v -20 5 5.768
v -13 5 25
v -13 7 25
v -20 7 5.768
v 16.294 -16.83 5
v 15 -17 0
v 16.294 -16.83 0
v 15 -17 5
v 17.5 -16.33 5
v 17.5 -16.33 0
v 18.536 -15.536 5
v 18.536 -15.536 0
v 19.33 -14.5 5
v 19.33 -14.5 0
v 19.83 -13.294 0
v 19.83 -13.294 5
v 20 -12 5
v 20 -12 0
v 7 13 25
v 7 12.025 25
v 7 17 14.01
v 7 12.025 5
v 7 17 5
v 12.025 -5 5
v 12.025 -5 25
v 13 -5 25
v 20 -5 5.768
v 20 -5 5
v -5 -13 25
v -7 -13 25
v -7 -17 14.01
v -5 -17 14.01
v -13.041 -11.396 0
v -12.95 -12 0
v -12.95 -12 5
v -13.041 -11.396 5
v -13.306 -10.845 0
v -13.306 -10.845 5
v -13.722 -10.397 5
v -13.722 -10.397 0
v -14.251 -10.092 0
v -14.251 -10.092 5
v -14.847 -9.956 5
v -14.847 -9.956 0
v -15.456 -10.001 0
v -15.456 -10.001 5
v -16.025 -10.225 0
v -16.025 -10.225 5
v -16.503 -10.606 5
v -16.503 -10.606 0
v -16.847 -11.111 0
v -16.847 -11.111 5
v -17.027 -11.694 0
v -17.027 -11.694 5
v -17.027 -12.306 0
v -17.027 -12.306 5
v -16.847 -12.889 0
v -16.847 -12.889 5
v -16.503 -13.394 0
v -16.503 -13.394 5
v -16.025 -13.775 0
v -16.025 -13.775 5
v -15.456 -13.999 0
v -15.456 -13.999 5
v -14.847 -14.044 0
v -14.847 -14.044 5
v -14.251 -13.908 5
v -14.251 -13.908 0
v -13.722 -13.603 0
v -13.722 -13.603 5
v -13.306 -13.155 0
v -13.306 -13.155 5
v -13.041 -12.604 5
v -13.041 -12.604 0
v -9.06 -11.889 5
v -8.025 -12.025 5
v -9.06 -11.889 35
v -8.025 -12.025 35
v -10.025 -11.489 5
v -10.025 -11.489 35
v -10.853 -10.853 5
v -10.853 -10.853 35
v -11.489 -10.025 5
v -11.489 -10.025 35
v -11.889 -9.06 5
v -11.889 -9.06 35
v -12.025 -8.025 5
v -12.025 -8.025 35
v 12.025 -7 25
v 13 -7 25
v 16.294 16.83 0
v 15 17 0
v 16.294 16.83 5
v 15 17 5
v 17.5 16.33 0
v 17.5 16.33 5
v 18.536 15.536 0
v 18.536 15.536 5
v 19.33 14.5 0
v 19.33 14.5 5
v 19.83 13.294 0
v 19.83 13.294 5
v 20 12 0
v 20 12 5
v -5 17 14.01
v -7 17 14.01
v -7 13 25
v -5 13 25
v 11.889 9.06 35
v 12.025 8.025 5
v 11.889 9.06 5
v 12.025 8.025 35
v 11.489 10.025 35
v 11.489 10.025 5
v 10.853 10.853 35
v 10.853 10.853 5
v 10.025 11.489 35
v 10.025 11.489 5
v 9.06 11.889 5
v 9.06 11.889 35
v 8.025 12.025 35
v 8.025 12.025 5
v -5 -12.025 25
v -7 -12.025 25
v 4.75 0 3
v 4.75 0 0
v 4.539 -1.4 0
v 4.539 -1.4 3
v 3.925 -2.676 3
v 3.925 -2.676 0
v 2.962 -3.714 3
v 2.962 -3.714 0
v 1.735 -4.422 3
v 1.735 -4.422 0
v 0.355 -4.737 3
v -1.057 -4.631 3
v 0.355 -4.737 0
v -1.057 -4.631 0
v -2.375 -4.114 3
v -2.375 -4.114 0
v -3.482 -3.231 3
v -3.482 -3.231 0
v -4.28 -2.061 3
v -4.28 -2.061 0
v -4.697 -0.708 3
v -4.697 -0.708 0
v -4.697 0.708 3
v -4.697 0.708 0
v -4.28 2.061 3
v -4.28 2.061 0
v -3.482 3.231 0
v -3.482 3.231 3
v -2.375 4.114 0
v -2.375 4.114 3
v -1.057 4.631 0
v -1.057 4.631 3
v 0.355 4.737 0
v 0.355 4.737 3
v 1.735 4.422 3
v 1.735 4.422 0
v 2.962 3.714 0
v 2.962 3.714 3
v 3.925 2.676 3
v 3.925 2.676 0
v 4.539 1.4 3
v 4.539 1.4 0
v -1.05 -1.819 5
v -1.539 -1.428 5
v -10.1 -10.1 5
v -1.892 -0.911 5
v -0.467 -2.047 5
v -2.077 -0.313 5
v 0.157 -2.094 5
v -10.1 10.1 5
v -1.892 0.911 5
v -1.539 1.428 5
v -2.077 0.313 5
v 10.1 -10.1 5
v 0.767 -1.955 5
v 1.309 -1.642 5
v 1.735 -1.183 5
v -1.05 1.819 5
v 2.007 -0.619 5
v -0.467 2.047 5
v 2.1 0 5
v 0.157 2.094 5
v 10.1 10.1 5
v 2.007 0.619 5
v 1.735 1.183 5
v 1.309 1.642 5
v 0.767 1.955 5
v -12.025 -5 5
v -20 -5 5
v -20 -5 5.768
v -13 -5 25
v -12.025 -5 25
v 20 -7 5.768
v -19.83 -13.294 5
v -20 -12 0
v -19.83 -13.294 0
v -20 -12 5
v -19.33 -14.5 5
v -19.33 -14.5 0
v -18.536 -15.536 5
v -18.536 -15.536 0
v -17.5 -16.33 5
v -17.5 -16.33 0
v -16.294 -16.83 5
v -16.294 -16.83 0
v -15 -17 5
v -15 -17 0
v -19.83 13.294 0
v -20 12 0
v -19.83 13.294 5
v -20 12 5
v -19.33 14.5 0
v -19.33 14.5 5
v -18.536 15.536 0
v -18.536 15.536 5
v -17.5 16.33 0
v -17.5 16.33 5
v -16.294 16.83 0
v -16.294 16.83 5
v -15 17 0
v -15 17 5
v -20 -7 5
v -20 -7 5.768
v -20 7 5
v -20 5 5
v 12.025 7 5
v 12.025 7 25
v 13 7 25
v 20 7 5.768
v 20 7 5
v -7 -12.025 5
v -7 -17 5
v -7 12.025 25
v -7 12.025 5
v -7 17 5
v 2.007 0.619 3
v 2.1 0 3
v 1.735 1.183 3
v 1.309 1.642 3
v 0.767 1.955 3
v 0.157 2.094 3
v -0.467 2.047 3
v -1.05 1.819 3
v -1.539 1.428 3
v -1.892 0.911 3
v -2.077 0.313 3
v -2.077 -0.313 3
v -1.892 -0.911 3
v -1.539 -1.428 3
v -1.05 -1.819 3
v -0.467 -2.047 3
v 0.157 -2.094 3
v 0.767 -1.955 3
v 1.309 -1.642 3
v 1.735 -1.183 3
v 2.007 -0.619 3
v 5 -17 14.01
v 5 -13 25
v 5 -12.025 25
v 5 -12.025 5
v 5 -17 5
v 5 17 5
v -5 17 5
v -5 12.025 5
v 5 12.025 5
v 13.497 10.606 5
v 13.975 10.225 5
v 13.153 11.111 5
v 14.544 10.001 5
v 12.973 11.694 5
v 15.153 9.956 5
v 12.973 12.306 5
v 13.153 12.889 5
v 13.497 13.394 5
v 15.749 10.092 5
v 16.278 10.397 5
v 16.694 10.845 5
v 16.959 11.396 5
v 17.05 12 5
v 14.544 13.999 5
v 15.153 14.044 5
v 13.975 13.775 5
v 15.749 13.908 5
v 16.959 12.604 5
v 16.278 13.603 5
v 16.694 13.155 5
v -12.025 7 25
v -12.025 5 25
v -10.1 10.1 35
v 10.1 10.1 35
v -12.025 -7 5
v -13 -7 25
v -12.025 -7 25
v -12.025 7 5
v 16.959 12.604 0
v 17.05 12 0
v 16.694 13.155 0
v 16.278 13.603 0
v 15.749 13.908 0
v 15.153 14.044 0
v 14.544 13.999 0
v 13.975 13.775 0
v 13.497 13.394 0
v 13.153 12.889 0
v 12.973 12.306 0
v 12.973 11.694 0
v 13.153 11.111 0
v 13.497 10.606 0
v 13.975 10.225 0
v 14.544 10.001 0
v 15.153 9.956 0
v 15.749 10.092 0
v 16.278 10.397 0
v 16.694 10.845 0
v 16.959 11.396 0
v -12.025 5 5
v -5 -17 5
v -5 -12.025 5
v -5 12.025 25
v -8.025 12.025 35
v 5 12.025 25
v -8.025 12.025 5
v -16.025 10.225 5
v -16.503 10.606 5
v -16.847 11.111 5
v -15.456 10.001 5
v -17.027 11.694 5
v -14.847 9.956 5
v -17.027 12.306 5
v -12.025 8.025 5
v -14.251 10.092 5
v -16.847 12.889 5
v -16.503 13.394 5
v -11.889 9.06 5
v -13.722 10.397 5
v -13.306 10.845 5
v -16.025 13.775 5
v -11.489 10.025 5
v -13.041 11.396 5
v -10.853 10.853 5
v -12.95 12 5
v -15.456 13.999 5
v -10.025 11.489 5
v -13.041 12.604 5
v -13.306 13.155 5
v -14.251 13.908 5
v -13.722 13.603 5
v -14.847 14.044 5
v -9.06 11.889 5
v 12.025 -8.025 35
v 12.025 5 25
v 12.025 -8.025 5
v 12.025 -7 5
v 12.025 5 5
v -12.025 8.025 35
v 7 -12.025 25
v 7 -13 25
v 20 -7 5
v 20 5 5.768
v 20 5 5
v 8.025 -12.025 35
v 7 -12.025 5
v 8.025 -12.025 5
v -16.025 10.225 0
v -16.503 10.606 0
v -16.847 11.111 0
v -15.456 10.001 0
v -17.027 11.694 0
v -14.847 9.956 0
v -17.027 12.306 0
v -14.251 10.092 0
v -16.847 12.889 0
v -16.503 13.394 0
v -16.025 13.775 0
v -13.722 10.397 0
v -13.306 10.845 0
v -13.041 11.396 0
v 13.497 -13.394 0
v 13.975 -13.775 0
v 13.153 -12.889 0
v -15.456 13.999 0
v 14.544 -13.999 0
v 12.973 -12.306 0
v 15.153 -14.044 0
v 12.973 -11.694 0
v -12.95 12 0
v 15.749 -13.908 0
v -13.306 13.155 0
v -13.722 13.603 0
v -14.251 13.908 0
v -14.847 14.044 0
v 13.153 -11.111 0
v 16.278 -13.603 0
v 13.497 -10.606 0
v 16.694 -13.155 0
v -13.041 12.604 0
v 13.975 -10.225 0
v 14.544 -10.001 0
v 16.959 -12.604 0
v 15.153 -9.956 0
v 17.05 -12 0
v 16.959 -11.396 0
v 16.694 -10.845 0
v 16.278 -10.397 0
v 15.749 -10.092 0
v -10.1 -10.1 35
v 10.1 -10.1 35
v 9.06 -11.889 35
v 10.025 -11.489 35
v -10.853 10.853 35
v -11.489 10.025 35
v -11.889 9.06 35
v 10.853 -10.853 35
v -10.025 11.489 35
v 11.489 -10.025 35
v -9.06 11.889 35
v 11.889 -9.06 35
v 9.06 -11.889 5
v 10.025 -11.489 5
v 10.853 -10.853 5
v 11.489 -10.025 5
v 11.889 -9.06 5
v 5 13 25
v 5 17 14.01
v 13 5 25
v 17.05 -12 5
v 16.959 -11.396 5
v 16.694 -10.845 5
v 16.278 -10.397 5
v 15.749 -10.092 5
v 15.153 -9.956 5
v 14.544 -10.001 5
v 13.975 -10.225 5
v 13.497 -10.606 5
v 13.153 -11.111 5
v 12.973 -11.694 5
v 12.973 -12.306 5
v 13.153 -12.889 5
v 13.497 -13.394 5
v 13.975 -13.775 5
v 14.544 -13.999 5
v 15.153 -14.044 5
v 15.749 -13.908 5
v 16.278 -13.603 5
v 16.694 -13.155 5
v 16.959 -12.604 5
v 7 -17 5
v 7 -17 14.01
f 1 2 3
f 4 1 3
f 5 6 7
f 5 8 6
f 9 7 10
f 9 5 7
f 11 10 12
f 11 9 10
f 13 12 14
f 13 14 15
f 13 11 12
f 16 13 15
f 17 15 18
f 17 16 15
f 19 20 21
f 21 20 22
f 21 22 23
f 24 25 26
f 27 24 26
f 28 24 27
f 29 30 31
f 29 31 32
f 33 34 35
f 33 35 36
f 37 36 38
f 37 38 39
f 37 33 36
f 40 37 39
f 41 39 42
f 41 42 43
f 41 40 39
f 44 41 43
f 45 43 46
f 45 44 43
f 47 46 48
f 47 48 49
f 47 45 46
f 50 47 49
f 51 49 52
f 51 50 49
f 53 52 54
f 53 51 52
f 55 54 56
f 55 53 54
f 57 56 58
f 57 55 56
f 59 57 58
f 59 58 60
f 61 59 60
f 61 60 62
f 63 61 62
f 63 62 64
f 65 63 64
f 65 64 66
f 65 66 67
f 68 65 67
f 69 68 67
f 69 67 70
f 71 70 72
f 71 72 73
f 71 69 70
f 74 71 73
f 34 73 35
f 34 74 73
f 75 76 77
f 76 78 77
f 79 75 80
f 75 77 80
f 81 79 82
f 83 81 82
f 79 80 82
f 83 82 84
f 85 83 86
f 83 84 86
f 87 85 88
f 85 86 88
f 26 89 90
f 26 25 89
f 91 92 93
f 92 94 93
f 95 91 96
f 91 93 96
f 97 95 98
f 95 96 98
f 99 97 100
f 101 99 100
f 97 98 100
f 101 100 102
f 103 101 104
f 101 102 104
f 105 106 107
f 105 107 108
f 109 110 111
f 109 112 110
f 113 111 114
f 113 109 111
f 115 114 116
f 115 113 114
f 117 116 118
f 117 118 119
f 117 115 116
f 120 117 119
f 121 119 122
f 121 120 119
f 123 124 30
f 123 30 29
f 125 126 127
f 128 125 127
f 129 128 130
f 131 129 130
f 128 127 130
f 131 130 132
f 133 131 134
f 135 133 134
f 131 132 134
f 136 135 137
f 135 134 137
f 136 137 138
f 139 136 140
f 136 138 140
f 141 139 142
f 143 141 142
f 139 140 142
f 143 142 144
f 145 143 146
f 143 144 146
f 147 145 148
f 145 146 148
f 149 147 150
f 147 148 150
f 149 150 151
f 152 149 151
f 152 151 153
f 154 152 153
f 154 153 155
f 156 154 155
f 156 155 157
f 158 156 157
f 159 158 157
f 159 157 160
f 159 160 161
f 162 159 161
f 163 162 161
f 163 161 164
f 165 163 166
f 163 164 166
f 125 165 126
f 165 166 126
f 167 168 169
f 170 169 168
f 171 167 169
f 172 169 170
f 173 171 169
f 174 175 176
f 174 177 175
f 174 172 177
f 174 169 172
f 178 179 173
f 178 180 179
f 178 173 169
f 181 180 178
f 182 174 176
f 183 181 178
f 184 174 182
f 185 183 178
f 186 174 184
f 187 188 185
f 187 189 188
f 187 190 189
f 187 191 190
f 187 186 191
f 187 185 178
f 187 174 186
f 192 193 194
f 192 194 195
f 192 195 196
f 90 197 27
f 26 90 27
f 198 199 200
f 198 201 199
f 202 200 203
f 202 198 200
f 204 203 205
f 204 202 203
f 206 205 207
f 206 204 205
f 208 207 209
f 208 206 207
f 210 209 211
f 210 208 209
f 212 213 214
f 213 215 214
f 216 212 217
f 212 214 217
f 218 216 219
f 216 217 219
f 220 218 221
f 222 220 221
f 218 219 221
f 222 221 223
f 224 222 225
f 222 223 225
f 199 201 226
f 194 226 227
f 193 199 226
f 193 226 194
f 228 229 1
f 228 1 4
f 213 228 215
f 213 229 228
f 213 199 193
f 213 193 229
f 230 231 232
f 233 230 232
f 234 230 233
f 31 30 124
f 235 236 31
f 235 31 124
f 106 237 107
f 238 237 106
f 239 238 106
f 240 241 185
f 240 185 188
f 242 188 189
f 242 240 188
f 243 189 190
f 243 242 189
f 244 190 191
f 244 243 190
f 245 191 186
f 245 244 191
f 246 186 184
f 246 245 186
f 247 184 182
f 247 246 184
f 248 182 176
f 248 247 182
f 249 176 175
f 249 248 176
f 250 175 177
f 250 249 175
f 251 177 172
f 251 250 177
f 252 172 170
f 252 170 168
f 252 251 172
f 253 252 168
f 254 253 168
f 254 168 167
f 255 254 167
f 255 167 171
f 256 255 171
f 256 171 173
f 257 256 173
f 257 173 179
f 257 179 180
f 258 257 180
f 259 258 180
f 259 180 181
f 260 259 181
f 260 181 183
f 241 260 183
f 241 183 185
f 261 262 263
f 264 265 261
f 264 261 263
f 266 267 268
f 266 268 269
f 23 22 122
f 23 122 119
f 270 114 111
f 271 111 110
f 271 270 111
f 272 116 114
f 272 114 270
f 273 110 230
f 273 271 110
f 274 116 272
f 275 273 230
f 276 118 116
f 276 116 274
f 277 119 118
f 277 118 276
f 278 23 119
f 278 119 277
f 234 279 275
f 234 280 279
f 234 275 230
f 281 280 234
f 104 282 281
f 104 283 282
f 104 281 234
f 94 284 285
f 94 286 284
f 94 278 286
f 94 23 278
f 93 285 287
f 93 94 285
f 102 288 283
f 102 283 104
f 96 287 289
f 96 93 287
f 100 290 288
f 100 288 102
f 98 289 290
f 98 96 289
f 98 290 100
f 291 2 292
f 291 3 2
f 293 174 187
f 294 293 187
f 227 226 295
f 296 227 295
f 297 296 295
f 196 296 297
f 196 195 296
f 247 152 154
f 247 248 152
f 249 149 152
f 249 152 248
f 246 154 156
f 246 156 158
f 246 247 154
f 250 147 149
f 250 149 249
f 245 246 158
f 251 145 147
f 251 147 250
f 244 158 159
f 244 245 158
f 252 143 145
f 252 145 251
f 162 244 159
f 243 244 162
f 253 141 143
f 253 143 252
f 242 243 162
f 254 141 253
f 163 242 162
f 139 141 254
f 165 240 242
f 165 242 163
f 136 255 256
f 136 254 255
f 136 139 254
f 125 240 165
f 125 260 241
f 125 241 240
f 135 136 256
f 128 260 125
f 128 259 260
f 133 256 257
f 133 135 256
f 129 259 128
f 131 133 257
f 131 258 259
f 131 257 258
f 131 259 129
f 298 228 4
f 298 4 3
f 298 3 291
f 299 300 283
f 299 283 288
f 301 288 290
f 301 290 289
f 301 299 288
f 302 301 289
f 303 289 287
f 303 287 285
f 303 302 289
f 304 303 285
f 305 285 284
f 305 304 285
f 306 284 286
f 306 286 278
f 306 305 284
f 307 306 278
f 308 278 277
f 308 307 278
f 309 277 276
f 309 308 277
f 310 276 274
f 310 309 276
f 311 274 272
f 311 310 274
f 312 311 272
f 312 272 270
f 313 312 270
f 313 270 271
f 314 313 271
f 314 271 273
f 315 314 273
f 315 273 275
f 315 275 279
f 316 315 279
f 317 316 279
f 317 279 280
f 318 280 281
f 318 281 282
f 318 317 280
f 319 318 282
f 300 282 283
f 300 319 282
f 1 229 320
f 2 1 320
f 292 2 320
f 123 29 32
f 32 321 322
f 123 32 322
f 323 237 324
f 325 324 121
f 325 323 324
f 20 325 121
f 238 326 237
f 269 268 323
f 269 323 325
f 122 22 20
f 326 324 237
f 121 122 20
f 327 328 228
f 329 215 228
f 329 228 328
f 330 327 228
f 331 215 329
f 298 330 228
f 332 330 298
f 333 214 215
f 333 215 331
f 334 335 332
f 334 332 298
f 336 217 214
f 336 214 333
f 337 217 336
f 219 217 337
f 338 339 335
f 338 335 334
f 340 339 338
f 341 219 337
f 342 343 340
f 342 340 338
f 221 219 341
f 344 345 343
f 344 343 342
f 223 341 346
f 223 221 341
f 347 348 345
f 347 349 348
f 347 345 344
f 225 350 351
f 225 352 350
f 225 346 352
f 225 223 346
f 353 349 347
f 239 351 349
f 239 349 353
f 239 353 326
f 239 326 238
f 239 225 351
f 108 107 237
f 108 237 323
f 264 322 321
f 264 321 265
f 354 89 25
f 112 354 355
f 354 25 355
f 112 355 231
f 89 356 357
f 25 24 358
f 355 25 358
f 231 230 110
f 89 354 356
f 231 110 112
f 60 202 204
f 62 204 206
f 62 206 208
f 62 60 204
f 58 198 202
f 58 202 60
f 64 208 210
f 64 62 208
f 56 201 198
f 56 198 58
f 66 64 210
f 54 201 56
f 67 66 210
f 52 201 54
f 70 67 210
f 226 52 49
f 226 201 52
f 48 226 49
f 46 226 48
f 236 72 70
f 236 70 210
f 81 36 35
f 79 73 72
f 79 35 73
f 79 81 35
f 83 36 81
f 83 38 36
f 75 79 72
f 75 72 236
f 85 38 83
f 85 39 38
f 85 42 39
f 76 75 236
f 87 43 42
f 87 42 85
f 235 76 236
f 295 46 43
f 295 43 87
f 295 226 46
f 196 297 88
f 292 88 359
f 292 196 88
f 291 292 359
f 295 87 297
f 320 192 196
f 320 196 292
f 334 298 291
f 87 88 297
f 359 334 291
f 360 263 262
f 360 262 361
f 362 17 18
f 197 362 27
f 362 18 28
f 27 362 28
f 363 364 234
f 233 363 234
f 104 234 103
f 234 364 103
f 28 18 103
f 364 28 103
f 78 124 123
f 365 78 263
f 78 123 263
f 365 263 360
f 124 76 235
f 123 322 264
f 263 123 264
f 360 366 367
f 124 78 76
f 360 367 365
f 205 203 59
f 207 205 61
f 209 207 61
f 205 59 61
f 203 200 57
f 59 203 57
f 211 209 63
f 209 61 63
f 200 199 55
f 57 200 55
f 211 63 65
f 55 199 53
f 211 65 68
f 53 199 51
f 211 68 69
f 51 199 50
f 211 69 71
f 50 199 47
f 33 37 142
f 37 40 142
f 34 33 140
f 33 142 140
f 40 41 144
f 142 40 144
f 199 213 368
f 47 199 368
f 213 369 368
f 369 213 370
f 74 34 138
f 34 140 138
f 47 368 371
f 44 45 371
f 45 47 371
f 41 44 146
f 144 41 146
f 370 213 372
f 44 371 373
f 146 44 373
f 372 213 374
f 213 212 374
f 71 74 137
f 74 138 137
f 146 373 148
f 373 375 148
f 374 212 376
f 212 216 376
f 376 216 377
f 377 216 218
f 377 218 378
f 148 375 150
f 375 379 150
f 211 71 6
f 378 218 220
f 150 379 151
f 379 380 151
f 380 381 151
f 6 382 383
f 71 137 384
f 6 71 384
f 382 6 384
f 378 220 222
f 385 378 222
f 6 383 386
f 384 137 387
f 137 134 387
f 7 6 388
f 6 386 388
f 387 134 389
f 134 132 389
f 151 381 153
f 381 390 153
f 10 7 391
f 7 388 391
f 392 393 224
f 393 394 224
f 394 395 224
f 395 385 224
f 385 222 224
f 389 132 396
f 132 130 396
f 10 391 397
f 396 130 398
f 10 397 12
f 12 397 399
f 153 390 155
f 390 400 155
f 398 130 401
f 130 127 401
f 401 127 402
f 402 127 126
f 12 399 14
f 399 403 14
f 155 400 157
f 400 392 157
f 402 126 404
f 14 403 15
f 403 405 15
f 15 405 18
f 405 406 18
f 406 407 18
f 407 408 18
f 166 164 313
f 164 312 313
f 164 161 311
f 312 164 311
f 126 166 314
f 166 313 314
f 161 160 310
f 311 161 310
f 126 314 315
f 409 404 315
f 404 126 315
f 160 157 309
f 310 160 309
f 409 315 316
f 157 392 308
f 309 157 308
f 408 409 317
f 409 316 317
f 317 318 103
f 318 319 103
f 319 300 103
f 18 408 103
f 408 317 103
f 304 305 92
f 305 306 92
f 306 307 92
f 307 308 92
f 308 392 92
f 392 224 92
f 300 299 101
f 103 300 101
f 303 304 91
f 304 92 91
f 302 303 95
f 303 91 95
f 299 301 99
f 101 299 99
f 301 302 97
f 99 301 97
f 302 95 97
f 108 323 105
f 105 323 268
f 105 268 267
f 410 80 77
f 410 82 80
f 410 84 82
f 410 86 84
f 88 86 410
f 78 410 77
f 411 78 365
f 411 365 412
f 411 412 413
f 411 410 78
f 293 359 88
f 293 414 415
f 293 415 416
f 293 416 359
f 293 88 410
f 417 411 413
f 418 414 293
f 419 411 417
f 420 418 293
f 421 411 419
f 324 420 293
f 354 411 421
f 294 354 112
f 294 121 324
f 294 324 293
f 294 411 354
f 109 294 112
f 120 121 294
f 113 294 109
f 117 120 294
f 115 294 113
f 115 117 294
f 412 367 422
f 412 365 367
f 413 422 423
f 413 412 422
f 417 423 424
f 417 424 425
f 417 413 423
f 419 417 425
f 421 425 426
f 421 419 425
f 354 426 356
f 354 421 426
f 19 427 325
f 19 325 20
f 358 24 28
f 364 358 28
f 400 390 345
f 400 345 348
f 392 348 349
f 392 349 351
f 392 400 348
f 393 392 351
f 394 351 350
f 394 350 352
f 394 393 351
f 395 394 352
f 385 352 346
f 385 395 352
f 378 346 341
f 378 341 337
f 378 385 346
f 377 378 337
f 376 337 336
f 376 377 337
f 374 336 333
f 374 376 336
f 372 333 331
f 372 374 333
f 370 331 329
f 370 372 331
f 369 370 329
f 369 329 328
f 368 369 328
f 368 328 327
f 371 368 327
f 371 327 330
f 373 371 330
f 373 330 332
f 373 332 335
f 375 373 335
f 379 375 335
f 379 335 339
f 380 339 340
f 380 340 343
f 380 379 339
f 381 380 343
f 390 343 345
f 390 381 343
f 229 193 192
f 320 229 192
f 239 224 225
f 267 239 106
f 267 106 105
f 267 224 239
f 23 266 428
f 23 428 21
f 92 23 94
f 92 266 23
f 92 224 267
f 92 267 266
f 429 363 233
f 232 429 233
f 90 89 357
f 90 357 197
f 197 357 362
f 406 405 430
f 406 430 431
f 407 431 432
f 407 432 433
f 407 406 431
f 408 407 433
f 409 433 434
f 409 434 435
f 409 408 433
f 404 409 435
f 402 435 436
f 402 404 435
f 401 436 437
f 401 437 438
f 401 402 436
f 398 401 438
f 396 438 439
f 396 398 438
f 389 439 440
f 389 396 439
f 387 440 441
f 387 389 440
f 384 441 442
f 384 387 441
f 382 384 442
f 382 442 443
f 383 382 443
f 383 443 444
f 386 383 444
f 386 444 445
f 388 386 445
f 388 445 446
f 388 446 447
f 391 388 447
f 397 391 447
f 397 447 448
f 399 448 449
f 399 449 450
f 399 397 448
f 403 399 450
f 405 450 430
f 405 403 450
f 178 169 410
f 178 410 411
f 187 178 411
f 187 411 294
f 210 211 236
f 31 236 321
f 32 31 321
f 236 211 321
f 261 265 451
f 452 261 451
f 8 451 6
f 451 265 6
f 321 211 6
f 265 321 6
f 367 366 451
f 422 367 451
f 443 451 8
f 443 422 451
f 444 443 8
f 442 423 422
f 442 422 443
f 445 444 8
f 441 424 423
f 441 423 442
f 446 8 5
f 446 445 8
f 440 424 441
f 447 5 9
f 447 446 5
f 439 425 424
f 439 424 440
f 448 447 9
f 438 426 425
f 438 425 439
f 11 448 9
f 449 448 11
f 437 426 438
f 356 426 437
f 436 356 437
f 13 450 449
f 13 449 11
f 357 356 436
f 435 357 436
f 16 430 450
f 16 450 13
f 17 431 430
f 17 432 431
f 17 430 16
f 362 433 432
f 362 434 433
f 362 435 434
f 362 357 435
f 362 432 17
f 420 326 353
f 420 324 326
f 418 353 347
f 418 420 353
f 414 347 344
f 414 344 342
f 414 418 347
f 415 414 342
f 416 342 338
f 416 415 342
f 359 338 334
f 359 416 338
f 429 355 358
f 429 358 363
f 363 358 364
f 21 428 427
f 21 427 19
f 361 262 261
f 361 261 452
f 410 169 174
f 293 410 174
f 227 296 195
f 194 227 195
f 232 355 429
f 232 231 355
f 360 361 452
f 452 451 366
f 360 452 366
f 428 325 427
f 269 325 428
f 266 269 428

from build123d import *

# Parameters (mm, degrees)
F0_W        = 40
F0_H        = 34
F0_R        = 2.05
F0_R_2      = 2.1
F1_DEPTH    = 5
F2_R        = 4.75
F2_R_2      = 2.1
F3_DEPTH    = 3
F4_W        = 24.05
F4_H        = 24.05
F4_W_2      = 20.2
F4_H_2      = 20.2
F5_DEPTH    = 30
F6_R        = 5
F7_R        = 4
F8_W        = 2
F8_H        = 4.975
F8_W_2      = 7.975
F8_H_2      = 2
F9_DEPTH    = 20
F10_SIZE2   = 19.2323419362
F10_SIZE    = 7
F10_2_SIZE2 = 19.2323419362
F10_2_SIZE  = 7
F11_SIZE2   = 7
F11_SIZE    = 19.2323419362
F12_SIZE2   = 4
F12_SIZE    = 10.9899096778
F13_SIZE2   = 10.9899096778
F13_SIZE    = 4
F13_2_SIZE2 = 10.9899096778
F13_2_SIZE  = 4


with BuildPart() as f1:
    # F0 (on Top) → F1 (new body)
    with BuildSketch(Plane.XY):
        Rectangle(F0_W, F0_H)
        with Locations((-15, -12)):
            Circle(F0_R, mode=Mode.SUBTRACT)
        with Locations((15, -12)):
            Circle(F0_R, mode=Mode.SUBTRACT)
        with Locations((-15, 12)):
            Circle(F0_R, mode=Mode.SUBTRACT)
        Circle(F0_R_2, mode=Mode.SUBTRACT)
        with Locations((15, 12)):
            Circle(F0_R, mode=Mode.SUBTRACT)
    extrude(amount=F1_DEPTH)

    # F2 (on face) → F3 (cut)
    with BuildSketch(Plane(origin=(0, 0, 0), x_dir=(1, 0, 0), z_dir=(0, 0, -1))):
        Circle(F2_R)
        Circle(F2_R_2, mode=Mode.SUBTRACT)
    extrude(amount=-F3_DEPTH, mode=Mode.SUBTRACT)

    # F4 (on face) → F5 (join)
    with BuildSketch(Plane.XY.offset(5)):
        Rectangle(F4_W, F4_H)
        Rectangle(F4_W_2, F4_H_2, mode=Mode.SUBTRACT)
    extrude(amount=F5_DEPTH)

    # F6
    f6_edges = [f1.edges().sort_by_distance(p)[0] for p in [
        (20, 17, 2.5),
        (20, -17, 2.5),
        (-20, -17, 2.5),
        (-20, 17, 2.5),
    ]]
    fillet(f6_edges, radius=F6_R)

    # F7
    f7_edges = [f1.edges().sort_by_distance(p)[0] for p in [
        (12.025, -12.025, 20),
        (12.025, 12.025, 20),
        (-12.025, -12.025, 20),
        (-12.025, 12.025, 20),
    ]]
    fillet(f7_edges, radius=F7_R)

    # F8 (on face) → F9 (join)
    with BuildSketch(Plane.XY.offset(5)):
        with Locations((-6, 14.5125)):
            Rectangle(F8_W, F8_H)
        with Locations((6, 14.5125)):
            Rectangle(F8_W, F8_H)
        with Locations((16.0125, 6)):
            Rectangle(F8_W_2, F8_H_2)
        with Locations((16.0125, -6)):
            Rectangle(F8_W_2, F8_H_2)
        with Locations((6, -14.5125)):
            Rectangle(F8_W, F8_H)
        with Locations((-6, -14.5125)):
            Rectangle(F8_W, F8_H)
        with Locations((-16.0125, -6)):
            Rectangle(F8_W_2, F8_H_2)
        with Locations((-16.0125, 6)):
            Rectangle(F8_W_2, F8_H_2)
    extrude(amount=F9_DEPTH)

    # F10
    f10_edges = [f1.edges().sort_by_distance(p)[0] for p in [
        (20, 6, 25),
    ]]
    f10_side = f1.faces().sort_by_distance((16.0125, 6, 25))[0]
    chamfer(f10_edges, length=F10_SIZE, length2=F10_SIZE2, reference=f10_side)

    # F10#2
    f10_2_edges = [f1.edges().sort_by_distance(p)[0] for p in [
        (20, -6, 25),
    ]]
    f10_2_side = f1.faces().sort_by_distance((16.0125, -6, 25))[0]
    chamfer(f10_2_edges, length=F10_2_SIZE, length2=F10_2_SIZE2, reference=f10_2_side)

    # F11
    f11_edges = [f1.edges().sort_by_distance(p)[0] for p in [
        (-20, 6, 25),
        (-20, -6, 25),
    ]]
    f11_side = f1.faces().sort_by_distance((-20, 0, 0.346554))[0]
    chamfer(f11_edges, length=F11_SIZE, length2=F11_SIZE2, reference=f11_side)

    # F12
    f12_edges = [f1.edges().sort_by_distance(p)[0] for p in [
        (6, -17, 25),
        (-6, -17, 25),
    ]]
    f12_side = f1.faces().sort_by_distance((0, -17, 0.390512))[0]
    chamfer(f12_edges, length=F12_SIZE, length2=F12_SIZE2, reference=f12_side)

    # F13
    f13_edges = [f1.edges().sort_by_distance(p)[0] for p in [
        (-6, 17, 25),
    ]]
    f13_side = f1.faces().sort_by_distance((-6, 14.5125, 25))[0]
    chamfer(f13_edges, length=F13_SIZE, length2=F13_SIZE2, reference=f13_side)

    # F13#2
    f13_2_edges = [f1.edges().sort_by_distance(p)[0] for p in [
        (6, 17, 25),
    ]]
    f13_2_side = f1.faces().sort_by_distance((6, 14.5125, 25))[0]
    chamfer(f13_2_edges, length=F13_2_SIZE, length2=F13_2_SIZE2, reference=f13_2_side)


solid = f1.part
